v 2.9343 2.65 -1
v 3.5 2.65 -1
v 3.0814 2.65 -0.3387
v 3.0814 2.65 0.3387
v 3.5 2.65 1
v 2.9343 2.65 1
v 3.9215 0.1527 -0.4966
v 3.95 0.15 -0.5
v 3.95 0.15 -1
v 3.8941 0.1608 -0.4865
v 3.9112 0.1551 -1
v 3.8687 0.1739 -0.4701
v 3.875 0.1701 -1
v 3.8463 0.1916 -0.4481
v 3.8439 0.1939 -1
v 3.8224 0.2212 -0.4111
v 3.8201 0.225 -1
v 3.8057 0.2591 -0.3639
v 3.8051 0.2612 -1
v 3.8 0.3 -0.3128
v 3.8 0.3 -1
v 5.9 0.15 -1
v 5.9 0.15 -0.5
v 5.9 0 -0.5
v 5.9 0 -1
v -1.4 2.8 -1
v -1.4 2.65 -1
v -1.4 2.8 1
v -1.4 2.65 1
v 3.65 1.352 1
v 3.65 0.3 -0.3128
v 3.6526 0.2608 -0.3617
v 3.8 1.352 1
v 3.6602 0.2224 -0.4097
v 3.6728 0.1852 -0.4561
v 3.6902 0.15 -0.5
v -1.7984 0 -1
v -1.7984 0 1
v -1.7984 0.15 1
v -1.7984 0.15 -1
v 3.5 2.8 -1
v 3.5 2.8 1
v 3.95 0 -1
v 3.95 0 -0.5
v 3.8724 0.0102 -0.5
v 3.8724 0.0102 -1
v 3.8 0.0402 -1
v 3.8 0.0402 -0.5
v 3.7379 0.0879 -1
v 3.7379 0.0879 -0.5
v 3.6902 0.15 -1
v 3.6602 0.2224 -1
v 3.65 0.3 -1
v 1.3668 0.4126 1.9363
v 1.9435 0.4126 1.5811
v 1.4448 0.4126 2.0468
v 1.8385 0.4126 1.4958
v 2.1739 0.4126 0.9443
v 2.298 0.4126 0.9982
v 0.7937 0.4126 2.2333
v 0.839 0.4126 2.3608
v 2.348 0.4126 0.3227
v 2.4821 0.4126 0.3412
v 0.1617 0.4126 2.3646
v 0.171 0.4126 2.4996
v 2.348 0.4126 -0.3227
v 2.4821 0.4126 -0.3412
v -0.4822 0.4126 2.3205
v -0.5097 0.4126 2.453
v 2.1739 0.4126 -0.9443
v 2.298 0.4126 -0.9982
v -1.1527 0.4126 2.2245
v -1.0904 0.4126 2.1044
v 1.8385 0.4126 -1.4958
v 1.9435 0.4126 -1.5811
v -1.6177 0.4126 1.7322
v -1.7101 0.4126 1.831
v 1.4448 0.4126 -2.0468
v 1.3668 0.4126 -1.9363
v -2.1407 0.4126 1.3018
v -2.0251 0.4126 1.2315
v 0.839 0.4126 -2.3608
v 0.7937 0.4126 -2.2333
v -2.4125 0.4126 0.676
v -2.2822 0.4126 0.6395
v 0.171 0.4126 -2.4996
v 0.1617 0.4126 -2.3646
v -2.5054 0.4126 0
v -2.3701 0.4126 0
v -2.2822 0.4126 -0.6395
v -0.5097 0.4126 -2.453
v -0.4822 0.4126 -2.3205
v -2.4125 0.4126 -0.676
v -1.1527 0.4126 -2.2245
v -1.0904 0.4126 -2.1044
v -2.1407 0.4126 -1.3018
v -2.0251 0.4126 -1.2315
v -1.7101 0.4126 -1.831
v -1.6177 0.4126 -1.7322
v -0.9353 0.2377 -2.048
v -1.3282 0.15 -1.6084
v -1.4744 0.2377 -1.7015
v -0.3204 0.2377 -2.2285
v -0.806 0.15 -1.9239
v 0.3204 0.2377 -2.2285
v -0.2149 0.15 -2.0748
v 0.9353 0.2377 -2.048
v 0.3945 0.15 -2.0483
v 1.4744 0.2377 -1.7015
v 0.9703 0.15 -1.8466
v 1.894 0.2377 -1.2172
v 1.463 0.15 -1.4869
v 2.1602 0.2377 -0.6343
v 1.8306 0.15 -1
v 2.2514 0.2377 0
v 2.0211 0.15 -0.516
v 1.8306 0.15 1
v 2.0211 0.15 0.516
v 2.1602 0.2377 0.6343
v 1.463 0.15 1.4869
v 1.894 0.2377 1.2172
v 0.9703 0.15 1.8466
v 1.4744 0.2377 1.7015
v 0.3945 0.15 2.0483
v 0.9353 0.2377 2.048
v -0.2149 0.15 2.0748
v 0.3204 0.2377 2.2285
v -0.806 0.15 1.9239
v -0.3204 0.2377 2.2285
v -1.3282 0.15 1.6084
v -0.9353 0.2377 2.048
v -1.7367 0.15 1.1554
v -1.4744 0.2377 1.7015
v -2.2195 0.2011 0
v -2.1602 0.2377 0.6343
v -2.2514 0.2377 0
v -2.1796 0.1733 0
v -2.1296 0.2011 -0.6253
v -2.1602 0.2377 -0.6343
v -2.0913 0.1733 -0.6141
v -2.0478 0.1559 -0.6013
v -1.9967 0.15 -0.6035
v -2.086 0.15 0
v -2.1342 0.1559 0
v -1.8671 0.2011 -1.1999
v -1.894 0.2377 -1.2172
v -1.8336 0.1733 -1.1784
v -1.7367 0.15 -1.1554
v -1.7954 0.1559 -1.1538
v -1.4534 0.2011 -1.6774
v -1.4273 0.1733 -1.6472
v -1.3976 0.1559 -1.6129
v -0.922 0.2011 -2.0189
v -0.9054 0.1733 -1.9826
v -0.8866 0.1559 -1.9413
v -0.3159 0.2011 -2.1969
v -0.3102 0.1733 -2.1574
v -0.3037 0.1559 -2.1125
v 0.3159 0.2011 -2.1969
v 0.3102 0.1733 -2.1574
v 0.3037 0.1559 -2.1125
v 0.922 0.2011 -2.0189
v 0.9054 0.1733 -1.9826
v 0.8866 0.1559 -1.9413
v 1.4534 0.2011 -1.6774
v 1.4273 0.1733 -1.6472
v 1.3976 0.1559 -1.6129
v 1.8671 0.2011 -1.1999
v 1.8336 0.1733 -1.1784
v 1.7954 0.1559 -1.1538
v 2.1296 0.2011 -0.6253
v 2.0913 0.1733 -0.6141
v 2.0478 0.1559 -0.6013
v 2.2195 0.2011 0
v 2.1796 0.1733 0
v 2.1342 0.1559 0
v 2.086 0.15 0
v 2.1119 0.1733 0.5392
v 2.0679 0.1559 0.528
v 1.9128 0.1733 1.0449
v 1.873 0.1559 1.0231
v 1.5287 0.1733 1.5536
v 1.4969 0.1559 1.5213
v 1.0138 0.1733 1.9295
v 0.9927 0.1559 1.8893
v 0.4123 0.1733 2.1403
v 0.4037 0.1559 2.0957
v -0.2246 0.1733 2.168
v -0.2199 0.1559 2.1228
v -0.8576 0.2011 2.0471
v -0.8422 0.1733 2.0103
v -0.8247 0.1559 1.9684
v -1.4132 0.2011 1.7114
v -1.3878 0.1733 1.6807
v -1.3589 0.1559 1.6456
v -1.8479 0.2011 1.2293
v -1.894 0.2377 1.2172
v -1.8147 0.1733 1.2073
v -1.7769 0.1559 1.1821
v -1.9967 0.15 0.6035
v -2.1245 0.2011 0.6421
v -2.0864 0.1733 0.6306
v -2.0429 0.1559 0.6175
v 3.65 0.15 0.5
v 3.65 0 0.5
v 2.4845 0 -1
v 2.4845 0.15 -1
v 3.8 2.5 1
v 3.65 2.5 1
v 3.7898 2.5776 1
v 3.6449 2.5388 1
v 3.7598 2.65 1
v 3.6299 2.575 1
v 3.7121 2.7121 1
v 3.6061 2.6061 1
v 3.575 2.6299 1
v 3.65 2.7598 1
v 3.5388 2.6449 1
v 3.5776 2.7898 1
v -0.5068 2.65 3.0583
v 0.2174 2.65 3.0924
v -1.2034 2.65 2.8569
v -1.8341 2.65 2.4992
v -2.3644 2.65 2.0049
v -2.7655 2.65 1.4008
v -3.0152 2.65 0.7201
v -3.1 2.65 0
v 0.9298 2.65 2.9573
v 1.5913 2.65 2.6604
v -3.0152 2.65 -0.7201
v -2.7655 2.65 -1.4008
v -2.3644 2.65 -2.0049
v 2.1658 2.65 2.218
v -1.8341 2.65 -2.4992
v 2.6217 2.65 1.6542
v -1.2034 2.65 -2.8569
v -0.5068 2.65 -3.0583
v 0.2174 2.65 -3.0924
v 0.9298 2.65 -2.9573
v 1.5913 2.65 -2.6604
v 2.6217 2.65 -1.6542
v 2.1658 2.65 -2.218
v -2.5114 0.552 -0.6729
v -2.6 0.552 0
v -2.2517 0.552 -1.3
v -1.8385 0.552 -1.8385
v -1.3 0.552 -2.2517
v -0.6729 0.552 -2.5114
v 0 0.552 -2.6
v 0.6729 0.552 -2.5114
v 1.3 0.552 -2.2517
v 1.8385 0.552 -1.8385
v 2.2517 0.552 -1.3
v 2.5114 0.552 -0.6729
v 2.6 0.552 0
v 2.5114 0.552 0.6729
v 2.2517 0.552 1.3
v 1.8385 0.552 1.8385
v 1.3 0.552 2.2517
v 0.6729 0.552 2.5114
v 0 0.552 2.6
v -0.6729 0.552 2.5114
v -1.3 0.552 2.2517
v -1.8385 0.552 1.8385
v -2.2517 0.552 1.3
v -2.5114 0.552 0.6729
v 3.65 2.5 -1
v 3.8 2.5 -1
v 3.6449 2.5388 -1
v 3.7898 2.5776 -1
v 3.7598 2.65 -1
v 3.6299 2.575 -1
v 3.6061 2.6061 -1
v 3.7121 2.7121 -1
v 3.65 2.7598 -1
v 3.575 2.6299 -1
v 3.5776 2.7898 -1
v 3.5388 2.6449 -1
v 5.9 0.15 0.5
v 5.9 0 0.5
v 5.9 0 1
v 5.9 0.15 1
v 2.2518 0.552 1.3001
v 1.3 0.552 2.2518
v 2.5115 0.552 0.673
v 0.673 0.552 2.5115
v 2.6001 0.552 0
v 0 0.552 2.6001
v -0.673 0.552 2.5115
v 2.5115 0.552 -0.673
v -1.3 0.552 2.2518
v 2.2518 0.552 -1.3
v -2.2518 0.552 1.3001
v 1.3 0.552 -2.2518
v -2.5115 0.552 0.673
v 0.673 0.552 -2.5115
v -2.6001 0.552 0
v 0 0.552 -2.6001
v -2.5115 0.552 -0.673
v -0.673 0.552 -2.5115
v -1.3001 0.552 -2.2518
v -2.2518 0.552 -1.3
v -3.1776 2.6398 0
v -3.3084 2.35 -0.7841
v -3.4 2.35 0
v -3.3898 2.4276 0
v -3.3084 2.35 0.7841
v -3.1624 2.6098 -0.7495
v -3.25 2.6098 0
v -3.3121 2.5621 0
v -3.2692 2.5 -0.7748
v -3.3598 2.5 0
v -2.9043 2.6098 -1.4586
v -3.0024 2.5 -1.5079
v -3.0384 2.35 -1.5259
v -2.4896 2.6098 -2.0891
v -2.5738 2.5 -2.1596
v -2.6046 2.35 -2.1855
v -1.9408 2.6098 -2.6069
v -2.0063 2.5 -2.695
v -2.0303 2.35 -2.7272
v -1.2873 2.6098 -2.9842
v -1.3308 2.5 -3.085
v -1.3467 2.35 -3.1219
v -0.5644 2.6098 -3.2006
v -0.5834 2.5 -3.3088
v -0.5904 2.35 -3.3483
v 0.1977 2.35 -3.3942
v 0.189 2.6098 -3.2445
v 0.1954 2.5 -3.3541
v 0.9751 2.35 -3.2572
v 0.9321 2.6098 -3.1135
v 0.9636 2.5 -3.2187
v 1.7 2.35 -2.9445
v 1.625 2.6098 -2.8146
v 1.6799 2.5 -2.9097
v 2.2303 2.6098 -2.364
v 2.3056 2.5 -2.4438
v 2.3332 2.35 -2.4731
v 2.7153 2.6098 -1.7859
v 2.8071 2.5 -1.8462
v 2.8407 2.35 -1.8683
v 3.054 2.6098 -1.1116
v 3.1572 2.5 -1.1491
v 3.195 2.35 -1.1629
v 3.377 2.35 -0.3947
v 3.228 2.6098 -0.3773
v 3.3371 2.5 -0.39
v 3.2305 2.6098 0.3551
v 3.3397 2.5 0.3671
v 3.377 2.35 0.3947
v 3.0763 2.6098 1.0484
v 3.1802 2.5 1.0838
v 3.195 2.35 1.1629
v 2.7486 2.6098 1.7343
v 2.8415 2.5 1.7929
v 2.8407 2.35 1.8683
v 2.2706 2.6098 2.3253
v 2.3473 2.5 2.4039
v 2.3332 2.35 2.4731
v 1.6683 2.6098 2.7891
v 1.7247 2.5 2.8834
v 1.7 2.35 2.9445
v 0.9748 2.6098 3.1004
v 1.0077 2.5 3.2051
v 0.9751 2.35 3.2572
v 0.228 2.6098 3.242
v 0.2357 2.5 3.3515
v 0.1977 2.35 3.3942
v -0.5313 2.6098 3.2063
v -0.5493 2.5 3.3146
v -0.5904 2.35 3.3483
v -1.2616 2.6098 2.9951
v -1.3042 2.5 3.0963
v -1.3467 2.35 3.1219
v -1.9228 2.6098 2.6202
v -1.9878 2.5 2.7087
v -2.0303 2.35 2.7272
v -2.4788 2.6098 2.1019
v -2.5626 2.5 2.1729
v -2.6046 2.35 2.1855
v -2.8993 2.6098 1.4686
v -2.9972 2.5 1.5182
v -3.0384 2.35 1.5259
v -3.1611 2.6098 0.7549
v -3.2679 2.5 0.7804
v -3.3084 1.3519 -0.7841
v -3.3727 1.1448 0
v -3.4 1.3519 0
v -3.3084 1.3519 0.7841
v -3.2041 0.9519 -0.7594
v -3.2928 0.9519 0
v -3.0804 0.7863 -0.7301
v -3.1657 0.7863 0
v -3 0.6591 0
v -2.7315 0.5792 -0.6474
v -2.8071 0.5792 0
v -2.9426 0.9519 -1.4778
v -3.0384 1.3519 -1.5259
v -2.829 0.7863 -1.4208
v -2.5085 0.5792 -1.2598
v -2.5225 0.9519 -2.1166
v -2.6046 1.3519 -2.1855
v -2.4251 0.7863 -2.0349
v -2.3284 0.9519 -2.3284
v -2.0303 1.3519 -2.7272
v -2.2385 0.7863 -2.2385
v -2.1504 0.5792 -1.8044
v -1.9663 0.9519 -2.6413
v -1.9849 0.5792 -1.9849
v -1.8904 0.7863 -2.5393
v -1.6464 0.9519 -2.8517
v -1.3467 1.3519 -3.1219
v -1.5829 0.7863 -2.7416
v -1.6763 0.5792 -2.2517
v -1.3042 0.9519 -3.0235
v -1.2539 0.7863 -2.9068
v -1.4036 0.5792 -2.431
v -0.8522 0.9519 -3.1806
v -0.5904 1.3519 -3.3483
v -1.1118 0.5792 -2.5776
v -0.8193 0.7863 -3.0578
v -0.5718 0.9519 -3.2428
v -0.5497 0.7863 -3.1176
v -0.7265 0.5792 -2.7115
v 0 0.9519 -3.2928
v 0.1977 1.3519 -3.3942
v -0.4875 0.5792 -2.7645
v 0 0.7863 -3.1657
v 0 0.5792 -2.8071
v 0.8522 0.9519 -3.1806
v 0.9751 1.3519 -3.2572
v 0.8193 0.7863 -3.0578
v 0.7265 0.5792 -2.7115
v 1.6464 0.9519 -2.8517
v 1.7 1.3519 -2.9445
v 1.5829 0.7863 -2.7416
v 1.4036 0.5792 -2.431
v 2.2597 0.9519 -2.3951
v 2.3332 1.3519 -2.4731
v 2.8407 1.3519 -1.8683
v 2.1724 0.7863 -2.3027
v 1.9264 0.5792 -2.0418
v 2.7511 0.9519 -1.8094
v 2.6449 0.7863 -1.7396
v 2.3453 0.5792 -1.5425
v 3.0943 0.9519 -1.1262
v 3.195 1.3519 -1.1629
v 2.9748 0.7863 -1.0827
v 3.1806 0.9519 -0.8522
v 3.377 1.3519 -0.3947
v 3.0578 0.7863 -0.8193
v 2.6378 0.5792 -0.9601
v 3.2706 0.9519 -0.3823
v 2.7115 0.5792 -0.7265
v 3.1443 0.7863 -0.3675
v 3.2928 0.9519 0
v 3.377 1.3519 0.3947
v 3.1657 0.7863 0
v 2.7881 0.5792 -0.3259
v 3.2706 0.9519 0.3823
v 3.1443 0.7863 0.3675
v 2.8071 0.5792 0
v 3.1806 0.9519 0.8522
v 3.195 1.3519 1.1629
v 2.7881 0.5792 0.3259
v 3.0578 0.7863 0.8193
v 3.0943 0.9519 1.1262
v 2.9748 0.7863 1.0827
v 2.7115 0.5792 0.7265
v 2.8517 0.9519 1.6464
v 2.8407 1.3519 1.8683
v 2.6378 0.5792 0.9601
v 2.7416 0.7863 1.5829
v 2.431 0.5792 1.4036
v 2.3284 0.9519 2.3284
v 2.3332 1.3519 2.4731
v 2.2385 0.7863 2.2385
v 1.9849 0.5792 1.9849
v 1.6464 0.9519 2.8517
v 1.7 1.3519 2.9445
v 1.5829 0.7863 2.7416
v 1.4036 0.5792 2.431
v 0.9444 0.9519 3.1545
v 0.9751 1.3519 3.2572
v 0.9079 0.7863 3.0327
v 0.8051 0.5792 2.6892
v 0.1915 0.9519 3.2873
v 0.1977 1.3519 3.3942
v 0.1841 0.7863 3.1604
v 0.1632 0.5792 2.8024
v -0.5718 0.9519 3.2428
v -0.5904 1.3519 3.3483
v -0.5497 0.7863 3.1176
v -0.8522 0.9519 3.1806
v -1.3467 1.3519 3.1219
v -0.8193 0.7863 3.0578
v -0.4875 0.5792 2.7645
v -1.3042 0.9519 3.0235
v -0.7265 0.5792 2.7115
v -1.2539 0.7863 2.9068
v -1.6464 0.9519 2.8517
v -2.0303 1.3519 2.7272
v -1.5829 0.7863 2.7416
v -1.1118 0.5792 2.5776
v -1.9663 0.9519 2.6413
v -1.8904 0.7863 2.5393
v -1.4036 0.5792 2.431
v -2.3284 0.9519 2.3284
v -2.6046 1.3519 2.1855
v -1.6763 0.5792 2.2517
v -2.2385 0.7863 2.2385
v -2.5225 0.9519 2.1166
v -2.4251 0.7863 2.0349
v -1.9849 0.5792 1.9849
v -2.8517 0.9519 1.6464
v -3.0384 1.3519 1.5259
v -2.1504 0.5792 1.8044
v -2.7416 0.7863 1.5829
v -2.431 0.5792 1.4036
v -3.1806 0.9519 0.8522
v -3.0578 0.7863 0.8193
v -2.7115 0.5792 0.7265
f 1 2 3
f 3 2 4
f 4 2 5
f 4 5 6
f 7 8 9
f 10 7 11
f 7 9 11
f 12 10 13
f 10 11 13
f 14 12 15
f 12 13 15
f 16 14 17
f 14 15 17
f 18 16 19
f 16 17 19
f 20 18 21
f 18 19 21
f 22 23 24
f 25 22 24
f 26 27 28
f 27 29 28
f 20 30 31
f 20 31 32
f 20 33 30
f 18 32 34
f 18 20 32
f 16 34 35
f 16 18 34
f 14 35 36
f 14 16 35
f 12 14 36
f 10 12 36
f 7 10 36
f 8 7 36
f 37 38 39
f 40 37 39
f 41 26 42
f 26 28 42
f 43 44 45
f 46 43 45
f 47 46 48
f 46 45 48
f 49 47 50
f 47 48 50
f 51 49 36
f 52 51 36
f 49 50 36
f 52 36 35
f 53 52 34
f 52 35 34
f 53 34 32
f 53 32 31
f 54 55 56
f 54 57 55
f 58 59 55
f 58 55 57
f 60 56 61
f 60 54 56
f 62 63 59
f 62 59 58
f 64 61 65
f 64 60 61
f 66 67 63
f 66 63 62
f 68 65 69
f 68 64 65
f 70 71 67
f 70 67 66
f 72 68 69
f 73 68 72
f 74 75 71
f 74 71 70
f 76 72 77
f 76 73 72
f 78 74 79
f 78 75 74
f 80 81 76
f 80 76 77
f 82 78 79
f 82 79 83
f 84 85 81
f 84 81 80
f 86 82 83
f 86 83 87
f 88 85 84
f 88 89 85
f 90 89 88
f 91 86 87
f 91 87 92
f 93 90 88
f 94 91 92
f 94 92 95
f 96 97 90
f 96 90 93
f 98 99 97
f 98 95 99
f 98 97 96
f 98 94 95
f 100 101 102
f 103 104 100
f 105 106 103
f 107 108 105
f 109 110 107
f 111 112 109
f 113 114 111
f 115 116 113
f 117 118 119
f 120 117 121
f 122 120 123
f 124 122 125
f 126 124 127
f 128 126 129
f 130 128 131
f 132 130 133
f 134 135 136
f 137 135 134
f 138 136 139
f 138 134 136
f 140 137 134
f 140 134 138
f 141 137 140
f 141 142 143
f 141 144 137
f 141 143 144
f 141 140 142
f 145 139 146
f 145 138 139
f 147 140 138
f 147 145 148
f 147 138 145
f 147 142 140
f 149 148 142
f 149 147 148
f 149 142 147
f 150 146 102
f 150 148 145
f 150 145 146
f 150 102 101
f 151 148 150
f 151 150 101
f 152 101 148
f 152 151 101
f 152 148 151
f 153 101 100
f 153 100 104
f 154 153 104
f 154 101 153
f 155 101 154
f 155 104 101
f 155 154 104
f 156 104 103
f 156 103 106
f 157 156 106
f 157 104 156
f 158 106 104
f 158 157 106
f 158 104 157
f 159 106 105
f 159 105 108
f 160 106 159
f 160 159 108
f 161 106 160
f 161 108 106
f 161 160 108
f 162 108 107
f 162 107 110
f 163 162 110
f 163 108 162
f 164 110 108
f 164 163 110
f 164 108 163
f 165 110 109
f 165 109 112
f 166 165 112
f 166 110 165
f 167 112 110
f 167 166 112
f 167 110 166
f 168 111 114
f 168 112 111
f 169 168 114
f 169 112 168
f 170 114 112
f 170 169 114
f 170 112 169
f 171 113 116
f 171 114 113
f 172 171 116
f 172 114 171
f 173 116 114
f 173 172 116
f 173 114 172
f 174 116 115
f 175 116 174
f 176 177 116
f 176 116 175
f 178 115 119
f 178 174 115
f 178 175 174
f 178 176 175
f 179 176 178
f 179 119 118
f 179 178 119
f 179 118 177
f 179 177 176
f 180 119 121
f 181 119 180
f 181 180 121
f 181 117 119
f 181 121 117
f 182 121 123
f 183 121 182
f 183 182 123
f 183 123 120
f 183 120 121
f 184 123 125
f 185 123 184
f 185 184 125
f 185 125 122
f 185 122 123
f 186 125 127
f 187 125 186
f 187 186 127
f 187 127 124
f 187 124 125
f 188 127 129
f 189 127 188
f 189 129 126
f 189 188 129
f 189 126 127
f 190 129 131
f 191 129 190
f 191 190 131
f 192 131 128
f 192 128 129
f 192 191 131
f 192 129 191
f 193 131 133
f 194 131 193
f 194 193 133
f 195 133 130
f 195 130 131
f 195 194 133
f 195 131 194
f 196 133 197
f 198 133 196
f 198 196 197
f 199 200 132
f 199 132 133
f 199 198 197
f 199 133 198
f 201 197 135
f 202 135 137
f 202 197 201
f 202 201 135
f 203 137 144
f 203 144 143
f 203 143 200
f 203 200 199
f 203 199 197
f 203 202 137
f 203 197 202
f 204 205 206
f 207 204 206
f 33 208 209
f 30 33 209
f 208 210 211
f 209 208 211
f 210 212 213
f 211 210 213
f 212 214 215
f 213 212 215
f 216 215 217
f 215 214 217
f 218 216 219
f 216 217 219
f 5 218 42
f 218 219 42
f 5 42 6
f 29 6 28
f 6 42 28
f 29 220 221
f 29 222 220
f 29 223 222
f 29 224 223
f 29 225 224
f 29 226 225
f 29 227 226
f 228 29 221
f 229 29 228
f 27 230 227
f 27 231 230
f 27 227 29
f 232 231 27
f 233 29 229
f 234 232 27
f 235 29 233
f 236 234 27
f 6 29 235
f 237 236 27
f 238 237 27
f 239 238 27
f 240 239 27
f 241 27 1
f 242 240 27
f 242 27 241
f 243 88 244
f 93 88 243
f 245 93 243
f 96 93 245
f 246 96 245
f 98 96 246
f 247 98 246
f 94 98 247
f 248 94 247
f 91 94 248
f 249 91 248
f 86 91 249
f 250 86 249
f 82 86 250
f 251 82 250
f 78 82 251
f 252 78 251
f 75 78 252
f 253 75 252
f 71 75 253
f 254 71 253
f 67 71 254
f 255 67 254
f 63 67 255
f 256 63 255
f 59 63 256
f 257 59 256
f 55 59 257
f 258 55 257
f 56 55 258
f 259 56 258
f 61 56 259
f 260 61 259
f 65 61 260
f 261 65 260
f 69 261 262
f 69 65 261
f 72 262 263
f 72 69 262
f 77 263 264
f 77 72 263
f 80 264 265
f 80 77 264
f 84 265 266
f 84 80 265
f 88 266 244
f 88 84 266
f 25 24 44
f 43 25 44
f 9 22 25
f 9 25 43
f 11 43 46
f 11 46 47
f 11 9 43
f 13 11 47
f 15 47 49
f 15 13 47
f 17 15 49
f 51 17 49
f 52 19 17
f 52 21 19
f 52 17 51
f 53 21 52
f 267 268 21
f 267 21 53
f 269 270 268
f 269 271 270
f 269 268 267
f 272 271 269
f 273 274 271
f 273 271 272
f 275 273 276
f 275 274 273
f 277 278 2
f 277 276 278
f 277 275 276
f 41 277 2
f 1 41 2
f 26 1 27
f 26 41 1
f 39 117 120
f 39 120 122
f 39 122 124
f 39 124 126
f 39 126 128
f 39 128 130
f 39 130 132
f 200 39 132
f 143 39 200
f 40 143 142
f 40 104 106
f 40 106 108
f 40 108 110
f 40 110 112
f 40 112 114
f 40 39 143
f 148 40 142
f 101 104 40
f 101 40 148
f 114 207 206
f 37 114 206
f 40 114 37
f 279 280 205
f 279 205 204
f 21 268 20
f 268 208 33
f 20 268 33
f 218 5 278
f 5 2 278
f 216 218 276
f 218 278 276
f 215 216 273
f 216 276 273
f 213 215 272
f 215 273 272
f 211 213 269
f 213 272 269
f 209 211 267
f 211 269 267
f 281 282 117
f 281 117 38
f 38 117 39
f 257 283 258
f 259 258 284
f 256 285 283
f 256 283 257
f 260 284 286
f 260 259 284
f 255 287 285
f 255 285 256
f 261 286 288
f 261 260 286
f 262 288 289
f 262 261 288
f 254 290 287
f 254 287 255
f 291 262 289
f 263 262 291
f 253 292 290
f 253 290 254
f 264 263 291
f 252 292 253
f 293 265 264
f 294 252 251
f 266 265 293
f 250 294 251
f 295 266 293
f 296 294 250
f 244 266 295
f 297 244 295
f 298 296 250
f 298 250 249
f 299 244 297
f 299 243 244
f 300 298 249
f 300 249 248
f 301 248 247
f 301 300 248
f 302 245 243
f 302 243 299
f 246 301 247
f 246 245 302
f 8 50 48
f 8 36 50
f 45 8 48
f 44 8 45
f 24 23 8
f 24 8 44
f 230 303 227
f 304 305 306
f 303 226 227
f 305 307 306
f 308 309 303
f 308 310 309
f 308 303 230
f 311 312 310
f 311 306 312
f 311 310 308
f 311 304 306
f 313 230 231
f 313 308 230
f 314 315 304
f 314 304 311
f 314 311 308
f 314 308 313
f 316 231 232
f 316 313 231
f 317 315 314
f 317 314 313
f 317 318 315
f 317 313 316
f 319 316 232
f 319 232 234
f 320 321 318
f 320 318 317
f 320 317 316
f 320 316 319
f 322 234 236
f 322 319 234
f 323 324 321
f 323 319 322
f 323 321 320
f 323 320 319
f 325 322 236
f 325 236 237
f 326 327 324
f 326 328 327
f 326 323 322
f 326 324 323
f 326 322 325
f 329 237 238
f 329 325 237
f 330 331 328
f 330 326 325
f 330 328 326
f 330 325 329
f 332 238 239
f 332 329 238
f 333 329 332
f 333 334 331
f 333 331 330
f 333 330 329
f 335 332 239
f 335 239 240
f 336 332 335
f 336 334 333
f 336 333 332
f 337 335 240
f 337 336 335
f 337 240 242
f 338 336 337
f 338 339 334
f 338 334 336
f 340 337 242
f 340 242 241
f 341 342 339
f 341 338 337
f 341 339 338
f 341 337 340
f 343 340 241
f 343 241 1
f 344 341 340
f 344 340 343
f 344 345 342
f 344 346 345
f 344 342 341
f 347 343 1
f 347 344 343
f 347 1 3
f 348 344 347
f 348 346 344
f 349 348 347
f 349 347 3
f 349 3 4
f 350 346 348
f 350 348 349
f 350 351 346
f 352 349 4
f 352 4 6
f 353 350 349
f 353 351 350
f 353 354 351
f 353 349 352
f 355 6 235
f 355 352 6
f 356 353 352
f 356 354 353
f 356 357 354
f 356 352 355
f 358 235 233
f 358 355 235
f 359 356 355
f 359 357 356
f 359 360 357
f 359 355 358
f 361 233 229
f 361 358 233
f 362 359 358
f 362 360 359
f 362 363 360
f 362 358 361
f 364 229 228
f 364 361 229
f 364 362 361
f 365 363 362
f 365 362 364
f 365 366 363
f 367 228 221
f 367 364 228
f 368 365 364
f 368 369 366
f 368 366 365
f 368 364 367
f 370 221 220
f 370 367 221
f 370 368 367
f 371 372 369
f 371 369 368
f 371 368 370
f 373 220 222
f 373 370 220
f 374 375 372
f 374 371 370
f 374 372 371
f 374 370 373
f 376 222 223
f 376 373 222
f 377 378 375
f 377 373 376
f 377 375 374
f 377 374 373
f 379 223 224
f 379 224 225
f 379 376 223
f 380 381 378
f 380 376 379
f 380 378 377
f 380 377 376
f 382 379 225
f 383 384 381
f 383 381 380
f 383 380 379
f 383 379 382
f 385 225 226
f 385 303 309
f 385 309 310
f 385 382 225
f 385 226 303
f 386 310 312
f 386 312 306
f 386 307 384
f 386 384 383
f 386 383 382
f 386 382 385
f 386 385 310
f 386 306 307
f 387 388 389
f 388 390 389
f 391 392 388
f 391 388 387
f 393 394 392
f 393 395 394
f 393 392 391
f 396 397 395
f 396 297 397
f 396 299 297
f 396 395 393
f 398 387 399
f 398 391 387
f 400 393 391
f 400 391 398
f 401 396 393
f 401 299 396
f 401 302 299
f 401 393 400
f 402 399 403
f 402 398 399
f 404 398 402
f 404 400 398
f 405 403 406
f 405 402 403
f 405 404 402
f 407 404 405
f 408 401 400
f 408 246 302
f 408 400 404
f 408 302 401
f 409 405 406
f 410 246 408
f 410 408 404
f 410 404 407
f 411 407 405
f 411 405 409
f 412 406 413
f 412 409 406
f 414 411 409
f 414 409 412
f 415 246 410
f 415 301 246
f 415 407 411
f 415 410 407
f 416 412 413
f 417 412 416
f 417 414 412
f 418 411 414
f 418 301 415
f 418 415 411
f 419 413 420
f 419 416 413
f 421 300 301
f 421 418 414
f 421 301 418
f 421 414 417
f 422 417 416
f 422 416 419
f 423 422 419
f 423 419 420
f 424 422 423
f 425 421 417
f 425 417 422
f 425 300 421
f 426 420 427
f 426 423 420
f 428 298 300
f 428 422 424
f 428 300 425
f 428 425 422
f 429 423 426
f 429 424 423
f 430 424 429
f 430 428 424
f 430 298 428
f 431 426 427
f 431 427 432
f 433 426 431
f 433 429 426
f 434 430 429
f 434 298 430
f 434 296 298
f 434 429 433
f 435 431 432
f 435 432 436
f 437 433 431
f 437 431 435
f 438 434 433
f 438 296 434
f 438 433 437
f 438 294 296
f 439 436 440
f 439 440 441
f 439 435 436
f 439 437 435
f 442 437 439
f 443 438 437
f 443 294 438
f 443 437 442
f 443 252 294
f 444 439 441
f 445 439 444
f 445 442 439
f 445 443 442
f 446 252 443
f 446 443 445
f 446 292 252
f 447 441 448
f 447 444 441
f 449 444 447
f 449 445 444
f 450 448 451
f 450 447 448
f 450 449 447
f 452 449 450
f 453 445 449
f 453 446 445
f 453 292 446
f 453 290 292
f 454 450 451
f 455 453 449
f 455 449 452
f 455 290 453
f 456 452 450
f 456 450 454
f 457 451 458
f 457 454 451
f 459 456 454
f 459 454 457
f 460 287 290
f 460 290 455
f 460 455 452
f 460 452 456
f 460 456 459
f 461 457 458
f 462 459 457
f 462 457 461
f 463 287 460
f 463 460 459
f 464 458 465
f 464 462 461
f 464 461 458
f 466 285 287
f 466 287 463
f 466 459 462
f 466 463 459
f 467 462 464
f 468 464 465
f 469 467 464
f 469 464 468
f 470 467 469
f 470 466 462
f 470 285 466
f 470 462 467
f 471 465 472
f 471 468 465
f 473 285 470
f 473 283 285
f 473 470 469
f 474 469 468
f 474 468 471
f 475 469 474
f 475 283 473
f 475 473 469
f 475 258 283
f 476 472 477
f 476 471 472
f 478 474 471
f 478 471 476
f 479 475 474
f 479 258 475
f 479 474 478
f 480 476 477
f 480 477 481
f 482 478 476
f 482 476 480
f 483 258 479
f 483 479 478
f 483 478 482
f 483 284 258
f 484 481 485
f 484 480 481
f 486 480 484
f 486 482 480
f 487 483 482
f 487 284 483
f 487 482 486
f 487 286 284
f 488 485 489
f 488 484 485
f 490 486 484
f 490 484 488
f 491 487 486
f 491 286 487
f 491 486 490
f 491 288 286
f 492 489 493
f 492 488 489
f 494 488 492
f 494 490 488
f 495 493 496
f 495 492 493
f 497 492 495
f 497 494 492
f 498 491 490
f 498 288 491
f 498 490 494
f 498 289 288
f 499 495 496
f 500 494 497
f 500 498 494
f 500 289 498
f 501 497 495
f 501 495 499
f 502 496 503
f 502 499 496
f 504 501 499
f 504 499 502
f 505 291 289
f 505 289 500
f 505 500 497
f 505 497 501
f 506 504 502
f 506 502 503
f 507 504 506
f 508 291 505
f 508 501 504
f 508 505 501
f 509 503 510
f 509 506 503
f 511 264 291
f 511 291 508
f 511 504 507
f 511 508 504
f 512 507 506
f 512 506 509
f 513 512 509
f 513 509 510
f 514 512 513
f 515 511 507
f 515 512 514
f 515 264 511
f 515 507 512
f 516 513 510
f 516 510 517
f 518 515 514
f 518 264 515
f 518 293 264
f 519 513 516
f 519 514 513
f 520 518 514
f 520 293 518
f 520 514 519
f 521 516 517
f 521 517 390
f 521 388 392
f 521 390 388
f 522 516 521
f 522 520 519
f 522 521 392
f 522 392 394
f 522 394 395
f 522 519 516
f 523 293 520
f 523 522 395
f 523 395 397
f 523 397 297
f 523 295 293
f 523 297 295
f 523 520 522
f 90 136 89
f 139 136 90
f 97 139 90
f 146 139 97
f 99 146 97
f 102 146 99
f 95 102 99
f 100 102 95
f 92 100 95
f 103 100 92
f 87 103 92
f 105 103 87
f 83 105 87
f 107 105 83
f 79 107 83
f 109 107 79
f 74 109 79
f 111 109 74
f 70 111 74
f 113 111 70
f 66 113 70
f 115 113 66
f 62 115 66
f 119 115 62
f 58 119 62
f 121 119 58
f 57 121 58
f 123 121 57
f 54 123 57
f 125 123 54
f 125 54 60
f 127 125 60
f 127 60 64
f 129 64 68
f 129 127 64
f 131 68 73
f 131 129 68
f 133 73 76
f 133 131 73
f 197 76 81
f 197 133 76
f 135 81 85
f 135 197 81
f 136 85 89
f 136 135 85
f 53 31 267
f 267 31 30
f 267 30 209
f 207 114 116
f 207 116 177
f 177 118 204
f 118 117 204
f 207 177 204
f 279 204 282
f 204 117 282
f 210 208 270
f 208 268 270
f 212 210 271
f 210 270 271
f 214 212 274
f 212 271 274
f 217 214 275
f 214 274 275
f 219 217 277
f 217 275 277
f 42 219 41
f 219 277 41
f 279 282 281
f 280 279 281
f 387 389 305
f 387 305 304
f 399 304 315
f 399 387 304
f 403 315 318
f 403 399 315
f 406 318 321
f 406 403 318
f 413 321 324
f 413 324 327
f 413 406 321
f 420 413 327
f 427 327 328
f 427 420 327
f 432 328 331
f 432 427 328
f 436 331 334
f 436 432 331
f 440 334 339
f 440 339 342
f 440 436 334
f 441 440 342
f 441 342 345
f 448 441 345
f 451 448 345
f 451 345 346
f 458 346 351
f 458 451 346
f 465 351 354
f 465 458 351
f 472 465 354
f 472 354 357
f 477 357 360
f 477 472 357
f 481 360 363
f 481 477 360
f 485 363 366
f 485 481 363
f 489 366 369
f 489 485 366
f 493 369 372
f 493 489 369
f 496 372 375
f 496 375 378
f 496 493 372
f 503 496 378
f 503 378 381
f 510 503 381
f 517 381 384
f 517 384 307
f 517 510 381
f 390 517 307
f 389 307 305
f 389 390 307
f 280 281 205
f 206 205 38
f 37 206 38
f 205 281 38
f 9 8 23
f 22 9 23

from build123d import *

# Parameters (mm, degrees)
FILLET_1_R          = 0.3
FILLET_2_R          = 0.8
FILLET_3_R          = 0.2
EXTRUDE_1_DEPTH     = 1
CUT_EXTRUDE_1_DEPTH = 2.25
CUT_EXTRUDE_2_DEPTH = 0.15
FILLET_5_R          = 0.15
FILLET_4_R          = 0.3


with BuildPart() as part:
    # 草图1 → 旋转1 (revolve)
    with BuildSketch(Plane.XY, mode=Mode.PRIVATE) as revolve_1_sk:
        Polygon((0, 2.65), (3.4, 2.65), (3.4, 0.551967957), (2.6, 0.551967957), (2.505416246, 0.412581372), (2.370117547, 0.412581372), (2.19193733, 0.15), (0, 0.15), align=None)
    revolve(revolve_1_sk.sketch.rotate(Axis((0, 2.65, 0), (0, -1, 0)), 180), axis=Axis((0, 2.65, 0), (0, -1, 0)))

    # 圆角1
    fillet_1_edges = [part.edges().sort_by_distance(p)[0] for p in [
        (3.4, 2.65, 0),
    ]]
    fillet(fillet_1_edges, radius=FILLET_1_R)

    # 圆角2
    fillet_2_edges = [part.edges().sort_by_distance(p)[0] for p in [
        (3.4, 0.551967957, 0),
    ]]
    fillet(fillet_2_edges, radius=FILLET_2_R - 0.0001)  # a hair under: the kernel refuses the full size

    # 圆角3
    fillet_3_edges = [part.edges().sort_by_distance(p)[0] for p in [
        (2.19193733, 0.15, 0),
    ]]
    fillet(fillet_3_edges, radius=FILLET_3_R)

    # 草图3 → 凸台-拉伸1 (add, symmetric)
    with BuildSketch(Plane.XY):
        Polygon((-1.798436821, 0.15), (3.65, 0.15), (3.65, 2.65), (-1.4, 2.65), (-1.4, 2.8), (3.8, 2.8), (3.8, 0.15), (5.9, 0.15), (5.9, 0), (-1.798436821, 0), align=None)
    extrude(amount=EXTRUDE_1_DEPTH, both=True)

    # 草图4 → 切除-拉伸1 (cut)
    with BuildSketch(Plane(origin=(5.9, 0, 0), x_dir=(0, 0, -1), z_dir=(1, 0, 0))):
        Polygon((-1, 1.351967957), (0.5, 0.15), (0.5, 0), (-0.5, 0), (-0.5, 0.15), (-1, 0.15), align=None)
    extrude(amount=-CUT_EXTRUDE_1_DEPTH, mode=Mode.SUBTRACT)

    # 草图5 → 切除-拉伸2 (cut)
    with BuildSketch(Plane.XZ):
        Polygon((3.65, 0.5), (2.484512448, -1), (3.65, -1), align=None)
    extrude(amount=-CUT_EXTRUDE_2_DEPTH, mode=Mode.SUBTRACT)

    # 圆角5
    fillet_5_edges = [part.edges().sort_by_distance(p)[0] for p in [
        (3.65, 2.65, 0),
        (3.8, 0.15, -0.75),
    ]]
    fillet(fillet_5_edges, radius=FILLET_5_R)

    # 圆角4
    fillet_4_edges = [part.edges().sort_by_distance(p)[0] for p in [
        (3.65, 0, -0.75),
        (3.8, 2.8, 0),
    ]]
    fillet(fillet_4_edges, radius=FILLET_4_R)


solid = part.part
